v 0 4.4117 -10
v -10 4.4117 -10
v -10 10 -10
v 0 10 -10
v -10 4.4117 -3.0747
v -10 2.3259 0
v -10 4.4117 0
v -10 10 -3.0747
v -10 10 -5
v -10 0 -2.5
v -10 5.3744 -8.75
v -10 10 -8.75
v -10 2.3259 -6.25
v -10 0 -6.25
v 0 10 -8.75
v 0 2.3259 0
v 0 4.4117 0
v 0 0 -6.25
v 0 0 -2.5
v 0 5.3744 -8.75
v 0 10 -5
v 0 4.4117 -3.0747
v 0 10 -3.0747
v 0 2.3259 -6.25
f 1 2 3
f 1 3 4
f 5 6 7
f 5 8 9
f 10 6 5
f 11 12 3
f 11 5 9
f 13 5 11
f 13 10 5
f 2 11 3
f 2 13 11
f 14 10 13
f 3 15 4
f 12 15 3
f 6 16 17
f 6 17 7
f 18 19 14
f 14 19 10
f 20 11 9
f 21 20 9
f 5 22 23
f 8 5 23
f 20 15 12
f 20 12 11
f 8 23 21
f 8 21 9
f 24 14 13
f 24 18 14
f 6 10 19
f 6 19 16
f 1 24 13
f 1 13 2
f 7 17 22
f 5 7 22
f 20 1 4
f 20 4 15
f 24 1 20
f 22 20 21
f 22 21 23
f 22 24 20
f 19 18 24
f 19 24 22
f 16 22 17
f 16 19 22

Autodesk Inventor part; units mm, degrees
ref_plane "YZ Plane" through (0, 0, 0) normal (1, 0, 0) x (0, 1, 0)
ref_plane "XZ Plane" through (0, 0, 0) normal (0, 1, 0) x (-1, 0, 0)
ref_plane "XY Plane" through (0, 0, 0) normal (0, 0, 1) x (1, 0, 0)
sketch "Sketch3" plane through (0, 0, 0) normal (0, 1, 0) x (-1, 0, 0)
  line L0 (0, 0) -> (10, 0)
  line L1 (10, 0) -> (10, -10)
  line L2 (10, -10) -> (0, -10)
  line L3 (0, -10) -> (0, 0)
  dimension "d7" = 10
  dimension "d8" = 10
extrude "Extrusion1" add sketch "Sketch3" along normal blind 10
sketch "Sketch4" plane through (0, 0, 0) normal (1, 0, 0) x (0, 0, -1)
  line L0 (10, 0) -> (0, 0) projected
  line L1 (0, 0) -> (0, 10) projected
  line L2 (0, 0) -> (2.5, 0)
  line L3 (2.5, 0) -> (0, 2.3259)
  dimension "d11" = 2.5
extrude "Extrusion2" cut sketch "Sketch4" against normal blind 10
sketch "Sketch5" plane through (0, 0, -10) normal (1, 0, 0) x (0, 0, -1)
  line L0 (0, 0) -> (-7.5, 0) projected
  line L1 (0, 0) -> (0, 10) projected
  line L2 (-10, 10) -> (0, 10) projected
  line L3 (-10, 2.3259) -> (-10, 10) projected
  line L4 (-3.75, 0) -> (-3.75, 2.3259)
  line L5 (-3.75, 2.3259) -> (0, 4.4117)
  line L6 (0, 0) -> (-3.75, 0)
  line L7 (-1.5, 10) -> (-1.5, 6)
  line L8 (-1.5, 6) -> (-4.6791, 10)
  point P0 (-10, 0)
  dimension "d14" = 4
extrude "Extrusion3" cut sketch "Sketch5" against normal blind 10 contours L0 L4 L5 L1
sketch "Sketch6" plane through (0, 10, 0) normal (1, 0, 0) x (0, 0, -1)
  line L0 (0, 0) -> (10, 0) projected
  line L1 (6.25, -10) -> (2.5, -10) projected
  line L2 (8.75, 0) -> (8.75, -4.6256)
  line L3 (8.75, -4.6256) -> (5, 0)
  line L4 (5, 0) -> (8.75, 0)
  point P0 (0, -10)
extrude "Extrusion4" cut sketch "Sketch6" against normal blind 10
sketch "Sketch7" plane through (0, 2.3259, 0) normal (1, 0, 0) x (0, 0, -1)
  line L0 (0, 7.6741) -> (5, 7.6741) projected
  line L1 (0, 0) -> (0, 7.6741) projected
  line L2 (3.0747, 7.6741) -> (0, 7.6741)
  line L3 (0, 7.6741) -> (0, 2.0858)
  line L4 (0, 2.0858) -> (3.0747, 2.0858)
  line L5 (3.0747, 2.0858) -> (3.0747, 7.6741)
  point P0 (0, -2.3259)
extrude "Extrusion5" cut sketch "Sketch7" against normal blind 10
properties part number "136"
